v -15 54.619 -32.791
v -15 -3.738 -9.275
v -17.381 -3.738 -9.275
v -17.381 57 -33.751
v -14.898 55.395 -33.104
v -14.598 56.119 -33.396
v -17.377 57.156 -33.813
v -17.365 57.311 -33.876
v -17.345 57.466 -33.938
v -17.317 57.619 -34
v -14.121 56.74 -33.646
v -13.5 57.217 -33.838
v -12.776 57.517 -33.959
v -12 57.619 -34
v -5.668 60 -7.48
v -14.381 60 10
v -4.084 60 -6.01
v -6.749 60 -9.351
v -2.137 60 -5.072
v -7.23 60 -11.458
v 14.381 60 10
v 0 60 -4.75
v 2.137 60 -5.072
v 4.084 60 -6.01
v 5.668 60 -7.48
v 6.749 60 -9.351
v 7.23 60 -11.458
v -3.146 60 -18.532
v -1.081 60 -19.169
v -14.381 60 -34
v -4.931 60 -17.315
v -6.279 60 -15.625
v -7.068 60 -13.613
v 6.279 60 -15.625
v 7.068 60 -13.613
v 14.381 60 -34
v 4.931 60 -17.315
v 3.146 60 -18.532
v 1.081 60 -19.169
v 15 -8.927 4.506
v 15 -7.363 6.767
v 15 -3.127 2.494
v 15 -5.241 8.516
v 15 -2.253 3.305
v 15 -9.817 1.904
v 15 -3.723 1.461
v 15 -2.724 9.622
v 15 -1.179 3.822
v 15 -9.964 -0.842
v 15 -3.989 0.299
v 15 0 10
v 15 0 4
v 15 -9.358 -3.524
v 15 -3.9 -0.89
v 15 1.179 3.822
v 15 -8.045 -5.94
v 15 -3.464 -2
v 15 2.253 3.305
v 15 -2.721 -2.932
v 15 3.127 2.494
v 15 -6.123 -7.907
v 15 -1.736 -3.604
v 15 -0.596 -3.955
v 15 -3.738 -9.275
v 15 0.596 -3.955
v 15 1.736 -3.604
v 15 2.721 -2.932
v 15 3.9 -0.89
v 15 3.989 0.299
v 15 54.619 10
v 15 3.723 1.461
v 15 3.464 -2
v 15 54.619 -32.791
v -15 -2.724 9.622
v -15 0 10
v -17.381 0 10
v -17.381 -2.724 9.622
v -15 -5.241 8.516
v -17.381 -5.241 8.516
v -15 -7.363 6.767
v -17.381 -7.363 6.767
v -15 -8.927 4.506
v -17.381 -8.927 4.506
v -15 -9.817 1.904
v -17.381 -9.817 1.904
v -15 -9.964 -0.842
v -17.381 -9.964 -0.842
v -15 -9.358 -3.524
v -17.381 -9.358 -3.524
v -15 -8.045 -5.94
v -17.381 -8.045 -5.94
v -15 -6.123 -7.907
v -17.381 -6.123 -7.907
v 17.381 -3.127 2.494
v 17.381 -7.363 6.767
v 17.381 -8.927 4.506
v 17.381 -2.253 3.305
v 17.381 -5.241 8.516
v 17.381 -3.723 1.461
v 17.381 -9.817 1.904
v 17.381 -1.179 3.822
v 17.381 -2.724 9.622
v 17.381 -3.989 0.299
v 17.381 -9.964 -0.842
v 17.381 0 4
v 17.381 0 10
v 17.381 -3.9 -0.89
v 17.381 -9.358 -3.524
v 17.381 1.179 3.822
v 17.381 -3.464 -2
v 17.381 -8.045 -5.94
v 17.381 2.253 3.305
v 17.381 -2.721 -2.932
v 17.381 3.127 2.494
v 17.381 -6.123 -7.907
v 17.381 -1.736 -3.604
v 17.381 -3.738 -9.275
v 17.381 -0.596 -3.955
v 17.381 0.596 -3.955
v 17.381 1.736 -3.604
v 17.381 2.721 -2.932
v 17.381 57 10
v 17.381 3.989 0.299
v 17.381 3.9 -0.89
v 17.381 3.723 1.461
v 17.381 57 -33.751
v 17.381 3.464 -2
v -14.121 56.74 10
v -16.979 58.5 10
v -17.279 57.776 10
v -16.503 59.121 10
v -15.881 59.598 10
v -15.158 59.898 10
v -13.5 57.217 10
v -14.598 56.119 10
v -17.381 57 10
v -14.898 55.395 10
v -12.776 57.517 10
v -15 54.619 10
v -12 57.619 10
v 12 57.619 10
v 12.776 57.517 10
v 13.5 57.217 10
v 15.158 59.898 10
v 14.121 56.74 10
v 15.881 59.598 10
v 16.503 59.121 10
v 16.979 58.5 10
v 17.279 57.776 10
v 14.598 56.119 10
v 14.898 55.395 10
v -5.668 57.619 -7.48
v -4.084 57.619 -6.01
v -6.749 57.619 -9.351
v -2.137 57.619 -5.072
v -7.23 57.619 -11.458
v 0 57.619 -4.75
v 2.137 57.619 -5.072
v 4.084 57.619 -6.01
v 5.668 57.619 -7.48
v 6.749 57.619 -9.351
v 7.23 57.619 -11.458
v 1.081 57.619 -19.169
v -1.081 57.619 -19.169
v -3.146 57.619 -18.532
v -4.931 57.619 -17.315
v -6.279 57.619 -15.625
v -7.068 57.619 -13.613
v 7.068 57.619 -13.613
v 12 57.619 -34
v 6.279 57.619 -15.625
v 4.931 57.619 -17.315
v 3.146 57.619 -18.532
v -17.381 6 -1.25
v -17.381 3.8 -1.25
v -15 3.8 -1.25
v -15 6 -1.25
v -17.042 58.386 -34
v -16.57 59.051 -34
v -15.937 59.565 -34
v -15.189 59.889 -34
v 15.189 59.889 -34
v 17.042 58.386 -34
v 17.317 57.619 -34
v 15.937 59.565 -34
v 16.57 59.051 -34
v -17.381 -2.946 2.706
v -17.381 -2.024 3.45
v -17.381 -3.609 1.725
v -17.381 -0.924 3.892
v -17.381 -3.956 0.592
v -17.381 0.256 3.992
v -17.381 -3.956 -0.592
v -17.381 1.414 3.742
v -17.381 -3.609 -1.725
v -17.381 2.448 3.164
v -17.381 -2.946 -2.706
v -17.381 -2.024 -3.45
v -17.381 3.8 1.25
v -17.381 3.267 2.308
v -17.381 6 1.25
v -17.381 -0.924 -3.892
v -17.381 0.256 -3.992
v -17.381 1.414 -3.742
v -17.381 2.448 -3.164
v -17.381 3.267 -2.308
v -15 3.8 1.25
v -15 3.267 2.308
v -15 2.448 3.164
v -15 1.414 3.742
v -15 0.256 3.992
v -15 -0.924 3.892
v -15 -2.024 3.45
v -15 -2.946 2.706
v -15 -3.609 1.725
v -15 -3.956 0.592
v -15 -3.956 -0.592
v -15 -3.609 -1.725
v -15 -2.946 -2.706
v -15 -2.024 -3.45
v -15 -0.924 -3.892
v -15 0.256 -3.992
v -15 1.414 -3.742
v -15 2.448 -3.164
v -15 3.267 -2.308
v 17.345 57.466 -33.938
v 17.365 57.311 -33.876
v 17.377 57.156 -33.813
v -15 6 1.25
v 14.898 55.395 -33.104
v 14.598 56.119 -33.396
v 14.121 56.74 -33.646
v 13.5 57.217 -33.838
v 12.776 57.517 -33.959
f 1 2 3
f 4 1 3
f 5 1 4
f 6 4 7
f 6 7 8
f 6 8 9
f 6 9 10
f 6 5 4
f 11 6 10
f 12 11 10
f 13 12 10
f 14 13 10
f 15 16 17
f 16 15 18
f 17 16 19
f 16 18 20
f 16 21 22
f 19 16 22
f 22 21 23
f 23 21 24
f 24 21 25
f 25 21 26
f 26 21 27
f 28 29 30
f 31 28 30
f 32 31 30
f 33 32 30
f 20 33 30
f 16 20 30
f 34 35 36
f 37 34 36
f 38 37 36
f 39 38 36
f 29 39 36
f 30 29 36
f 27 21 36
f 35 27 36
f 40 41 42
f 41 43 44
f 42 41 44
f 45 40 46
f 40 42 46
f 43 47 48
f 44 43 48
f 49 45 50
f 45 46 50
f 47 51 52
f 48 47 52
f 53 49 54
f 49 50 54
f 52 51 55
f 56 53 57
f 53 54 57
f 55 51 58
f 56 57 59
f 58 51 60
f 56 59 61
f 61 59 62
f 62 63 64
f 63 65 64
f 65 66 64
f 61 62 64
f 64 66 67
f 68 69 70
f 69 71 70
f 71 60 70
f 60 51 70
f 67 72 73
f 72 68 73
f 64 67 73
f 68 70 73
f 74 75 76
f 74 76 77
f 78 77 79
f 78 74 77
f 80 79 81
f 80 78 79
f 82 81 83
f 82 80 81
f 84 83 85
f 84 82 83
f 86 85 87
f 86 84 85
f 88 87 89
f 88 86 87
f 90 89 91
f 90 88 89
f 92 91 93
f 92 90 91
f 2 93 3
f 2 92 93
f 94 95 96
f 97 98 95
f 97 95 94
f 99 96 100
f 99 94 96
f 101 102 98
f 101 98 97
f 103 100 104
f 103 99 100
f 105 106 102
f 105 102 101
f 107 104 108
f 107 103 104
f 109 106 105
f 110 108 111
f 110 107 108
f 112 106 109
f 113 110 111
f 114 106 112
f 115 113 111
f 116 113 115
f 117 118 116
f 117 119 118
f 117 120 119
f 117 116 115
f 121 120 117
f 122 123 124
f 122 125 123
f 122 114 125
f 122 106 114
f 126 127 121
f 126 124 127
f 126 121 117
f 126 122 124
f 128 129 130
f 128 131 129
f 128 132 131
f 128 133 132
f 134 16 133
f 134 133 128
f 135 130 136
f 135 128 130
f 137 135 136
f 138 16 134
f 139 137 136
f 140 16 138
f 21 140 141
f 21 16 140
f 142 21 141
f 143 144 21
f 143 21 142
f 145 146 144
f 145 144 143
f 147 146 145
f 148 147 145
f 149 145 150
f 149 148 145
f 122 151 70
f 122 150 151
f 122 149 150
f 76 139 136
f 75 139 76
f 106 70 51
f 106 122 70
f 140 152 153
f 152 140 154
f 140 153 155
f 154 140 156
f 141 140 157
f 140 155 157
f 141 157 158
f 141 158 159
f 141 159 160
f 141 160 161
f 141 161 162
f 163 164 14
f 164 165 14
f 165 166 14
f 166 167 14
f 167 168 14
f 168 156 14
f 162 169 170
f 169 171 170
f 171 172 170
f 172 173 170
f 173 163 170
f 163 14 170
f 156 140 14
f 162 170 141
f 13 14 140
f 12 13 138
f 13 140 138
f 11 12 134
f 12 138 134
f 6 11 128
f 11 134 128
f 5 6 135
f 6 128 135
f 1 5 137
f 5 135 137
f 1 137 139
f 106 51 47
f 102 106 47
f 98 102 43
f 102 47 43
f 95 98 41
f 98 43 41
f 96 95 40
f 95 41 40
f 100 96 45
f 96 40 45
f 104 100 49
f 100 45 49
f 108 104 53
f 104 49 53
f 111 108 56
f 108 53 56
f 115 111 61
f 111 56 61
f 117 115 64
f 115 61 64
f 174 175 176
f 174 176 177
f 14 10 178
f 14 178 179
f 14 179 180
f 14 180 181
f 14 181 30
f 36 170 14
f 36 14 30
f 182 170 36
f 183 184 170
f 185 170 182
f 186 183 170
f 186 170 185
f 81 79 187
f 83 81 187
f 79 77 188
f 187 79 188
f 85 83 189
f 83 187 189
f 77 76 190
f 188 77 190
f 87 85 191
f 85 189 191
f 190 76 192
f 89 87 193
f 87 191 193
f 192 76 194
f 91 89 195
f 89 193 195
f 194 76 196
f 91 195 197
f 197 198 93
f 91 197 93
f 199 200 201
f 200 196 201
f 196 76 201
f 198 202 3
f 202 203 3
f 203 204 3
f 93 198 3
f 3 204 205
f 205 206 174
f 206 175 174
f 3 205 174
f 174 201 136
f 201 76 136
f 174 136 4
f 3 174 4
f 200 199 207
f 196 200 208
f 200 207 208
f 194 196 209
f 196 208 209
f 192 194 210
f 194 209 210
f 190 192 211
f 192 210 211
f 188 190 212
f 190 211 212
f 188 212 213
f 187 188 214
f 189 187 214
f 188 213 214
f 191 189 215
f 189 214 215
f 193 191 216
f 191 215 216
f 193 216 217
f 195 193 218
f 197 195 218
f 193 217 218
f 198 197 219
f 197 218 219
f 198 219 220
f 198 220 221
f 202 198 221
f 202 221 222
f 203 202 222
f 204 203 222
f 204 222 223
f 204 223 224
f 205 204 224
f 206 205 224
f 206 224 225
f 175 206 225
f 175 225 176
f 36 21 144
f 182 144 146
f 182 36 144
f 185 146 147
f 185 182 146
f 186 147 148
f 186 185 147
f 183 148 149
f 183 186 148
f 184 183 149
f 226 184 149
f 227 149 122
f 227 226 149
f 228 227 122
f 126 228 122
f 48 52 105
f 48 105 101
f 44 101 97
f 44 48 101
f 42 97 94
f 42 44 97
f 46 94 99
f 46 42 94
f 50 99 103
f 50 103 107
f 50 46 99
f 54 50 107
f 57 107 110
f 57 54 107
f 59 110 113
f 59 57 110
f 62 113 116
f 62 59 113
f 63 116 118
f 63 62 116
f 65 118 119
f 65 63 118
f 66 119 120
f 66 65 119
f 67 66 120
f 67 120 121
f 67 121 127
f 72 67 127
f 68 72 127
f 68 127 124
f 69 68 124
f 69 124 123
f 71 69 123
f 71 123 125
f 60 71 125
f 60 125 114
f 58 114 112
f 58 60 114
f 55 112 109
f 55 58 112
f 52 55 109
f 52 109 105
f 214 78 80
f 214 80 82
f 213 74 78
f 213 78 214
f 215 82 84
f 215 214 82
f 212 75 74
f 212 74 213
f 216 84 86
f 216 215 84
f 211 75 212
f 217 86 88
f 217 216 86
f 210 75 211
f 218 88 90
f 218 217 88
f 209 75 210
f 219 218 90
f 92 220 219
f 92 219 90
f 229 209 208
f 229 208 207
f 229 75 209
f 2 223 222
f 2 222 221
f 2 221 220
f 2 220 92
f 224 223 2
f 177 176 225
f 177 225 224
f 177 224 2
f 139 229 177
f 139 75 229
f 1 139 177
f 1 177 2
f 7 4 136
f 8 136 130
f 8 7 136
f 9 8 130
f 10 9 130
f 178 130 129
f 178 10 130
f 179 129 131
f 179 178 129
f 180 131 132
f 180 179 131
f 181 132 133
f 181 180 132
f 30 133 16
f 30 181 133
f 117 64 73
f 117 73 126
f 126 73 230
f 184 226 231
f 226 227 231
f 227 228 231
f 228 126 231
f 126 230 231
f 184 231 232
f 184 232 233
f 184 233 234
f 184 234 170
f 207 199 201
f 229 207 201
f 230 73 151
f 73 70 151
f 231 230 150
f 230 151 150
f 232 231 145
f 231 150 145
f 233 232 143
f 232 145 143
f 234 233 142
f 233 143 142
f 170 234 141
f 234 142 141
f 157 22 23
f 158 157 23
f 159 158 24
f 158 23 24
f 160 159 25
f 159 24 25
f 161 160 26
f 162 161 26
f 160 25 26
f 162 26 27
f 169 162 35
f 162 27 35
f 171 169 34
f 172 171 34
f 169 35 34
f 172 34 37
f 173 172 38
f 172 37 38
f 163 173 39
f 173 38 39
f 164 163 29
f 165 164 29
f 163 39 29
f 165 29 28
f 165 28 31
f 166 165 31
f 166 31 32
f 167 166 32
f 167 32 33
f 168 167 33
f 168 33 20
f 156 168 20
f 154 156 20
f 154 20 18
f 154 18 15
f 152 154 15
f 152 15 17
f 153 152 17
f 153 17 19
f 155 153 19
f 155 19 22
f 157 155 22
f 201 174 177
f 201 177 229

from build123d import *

# Parameters (mm, degrees)
TOP_DEPTH      = 10
TOP_DEPTH_BACK = 34
SKETCH1_W      = 30
SKETCH1_H      = 2.38125
SKETCH2_R      = 10
SKETCH2_R_2    = 4
SKETCH2_W      = 44
SKETCH2_H      = 2.38125
SIDE_DEPTH     = 2.38125
TOP_FILLETS_R  = 3
SKETCH3_R      = 7.25
TOP_HOLE_DEPTH = 80.737744209
KEYWAY_REACH   = 79.23
SKETCH4_W      = 2.5
SKETCH4_H      = 6


with BuildPart() as part:
    # Sketch1 → Top (new, two sides: drawn at the far end of the back side and taken through both)
    with BuildSketch(Plane.XY.offset(-TOP_DEPTH_BACK)):
        with Locations((0, 58.809375)):
            Rectangle(SKETCH1_W, SKETCH1_H)
    extrude(amount=TOP_DEPTH + TOP_DEPTH_BACK)

    # Sketch2 → Side (add)
    # profile 1 of 3: a face of its own
    with BuildSketch(Plane(origin=(15, 0, 0), x_dir=(0, 0, -1), z_dir=(1, 0, 0))):
        with BuildLine():
            Line((34, 57.61875), (-10, 57.61875))
            Line((-10, 57.61875), (-10, 0))
            ThreePointArc((-10, 0), (0, 10), (10, 0))
            ThreePointArc((10, 0), (9.817137723, -1.903629934), (9.275238615, -3.737639447))
            Line((9.275238615, -3.737639447), (34, 57.61875))
        make_face()
    # profile 2 of 3: a face of its own
    with BuildSketch(Plane(origin=(15, 0, 0), x_dir=(0, 0, -1), z_dir=(1, 0, 0))):
        Circle(SKETCH2_R)
        with Locations(Location((0, 0, 0), (0, 0, 180))):
            Circle(SKETCH2_R_2, mode=Mode.SUBTRACT)
    # profile 3 of 3: a face of its own
    with BuildSketch(Plane(origin=(15, 0, 0), x_dir=(0, 0, -1), z_dir=(1, 0, 0))):
        with Locations((12, 58.809375)):
            Rectangle(SKETCH2_W, SKETCH2_H)
    side = extrude(amount=SIDE_DEPTH)

    # Side Mirror: Side across plane
    add(side.mirror(Plane(origin=(0, 0, 0), x_dir=(0, 0, 1), z_dir=(1, 0, 0))))

    # Top Fillets
    top_fillets_edges = [part.edges().sort_by_distance(p)[0] for p in [
        (17.38125, 60, -12),
        (-17.38125, 60, -12),
        (15, 57.61875, -12),
        (-15, 57.61875, -12),
    ]]
    fillet(top_fillets_edges, radius=TOP_FILLETS_R)

    # Sketch3 → Top Hole (cut, through all)
    with BuildSketch(Plane(origin=(0, 60, 0), x_dir=(1, 0, 0), z_dir=(0, 1, 0))):
        with Locations(Location((0, 12, 0), (0, 0, 270))):
            Circle(SKETCH3_R)
    extrude(amount=-TOP_HOLE_DEPTH, mode=Mode.SUBTRACT)

    # Sketch4 → Keyway (cut, up to next)
    with BuildSketch(Plane.ZY.offset(17.38125), mode=Mode.PRIVATE) as keyway_sk1:
        with Locations((0, 3)):
            Rectangle(SKETCH4_W, SKETCH4_H)
    keyway_tool1 = extrude(keyway_sk1.sketch, amount=-KEYWAY_REACH, mode=Mode.PRIVATE) & part.part
    add(keyway_tool1.solids().sort_by_distance((-17.38125, 3, 0))[0], mode=Mode.SUBTRACT)


solid = part.part
